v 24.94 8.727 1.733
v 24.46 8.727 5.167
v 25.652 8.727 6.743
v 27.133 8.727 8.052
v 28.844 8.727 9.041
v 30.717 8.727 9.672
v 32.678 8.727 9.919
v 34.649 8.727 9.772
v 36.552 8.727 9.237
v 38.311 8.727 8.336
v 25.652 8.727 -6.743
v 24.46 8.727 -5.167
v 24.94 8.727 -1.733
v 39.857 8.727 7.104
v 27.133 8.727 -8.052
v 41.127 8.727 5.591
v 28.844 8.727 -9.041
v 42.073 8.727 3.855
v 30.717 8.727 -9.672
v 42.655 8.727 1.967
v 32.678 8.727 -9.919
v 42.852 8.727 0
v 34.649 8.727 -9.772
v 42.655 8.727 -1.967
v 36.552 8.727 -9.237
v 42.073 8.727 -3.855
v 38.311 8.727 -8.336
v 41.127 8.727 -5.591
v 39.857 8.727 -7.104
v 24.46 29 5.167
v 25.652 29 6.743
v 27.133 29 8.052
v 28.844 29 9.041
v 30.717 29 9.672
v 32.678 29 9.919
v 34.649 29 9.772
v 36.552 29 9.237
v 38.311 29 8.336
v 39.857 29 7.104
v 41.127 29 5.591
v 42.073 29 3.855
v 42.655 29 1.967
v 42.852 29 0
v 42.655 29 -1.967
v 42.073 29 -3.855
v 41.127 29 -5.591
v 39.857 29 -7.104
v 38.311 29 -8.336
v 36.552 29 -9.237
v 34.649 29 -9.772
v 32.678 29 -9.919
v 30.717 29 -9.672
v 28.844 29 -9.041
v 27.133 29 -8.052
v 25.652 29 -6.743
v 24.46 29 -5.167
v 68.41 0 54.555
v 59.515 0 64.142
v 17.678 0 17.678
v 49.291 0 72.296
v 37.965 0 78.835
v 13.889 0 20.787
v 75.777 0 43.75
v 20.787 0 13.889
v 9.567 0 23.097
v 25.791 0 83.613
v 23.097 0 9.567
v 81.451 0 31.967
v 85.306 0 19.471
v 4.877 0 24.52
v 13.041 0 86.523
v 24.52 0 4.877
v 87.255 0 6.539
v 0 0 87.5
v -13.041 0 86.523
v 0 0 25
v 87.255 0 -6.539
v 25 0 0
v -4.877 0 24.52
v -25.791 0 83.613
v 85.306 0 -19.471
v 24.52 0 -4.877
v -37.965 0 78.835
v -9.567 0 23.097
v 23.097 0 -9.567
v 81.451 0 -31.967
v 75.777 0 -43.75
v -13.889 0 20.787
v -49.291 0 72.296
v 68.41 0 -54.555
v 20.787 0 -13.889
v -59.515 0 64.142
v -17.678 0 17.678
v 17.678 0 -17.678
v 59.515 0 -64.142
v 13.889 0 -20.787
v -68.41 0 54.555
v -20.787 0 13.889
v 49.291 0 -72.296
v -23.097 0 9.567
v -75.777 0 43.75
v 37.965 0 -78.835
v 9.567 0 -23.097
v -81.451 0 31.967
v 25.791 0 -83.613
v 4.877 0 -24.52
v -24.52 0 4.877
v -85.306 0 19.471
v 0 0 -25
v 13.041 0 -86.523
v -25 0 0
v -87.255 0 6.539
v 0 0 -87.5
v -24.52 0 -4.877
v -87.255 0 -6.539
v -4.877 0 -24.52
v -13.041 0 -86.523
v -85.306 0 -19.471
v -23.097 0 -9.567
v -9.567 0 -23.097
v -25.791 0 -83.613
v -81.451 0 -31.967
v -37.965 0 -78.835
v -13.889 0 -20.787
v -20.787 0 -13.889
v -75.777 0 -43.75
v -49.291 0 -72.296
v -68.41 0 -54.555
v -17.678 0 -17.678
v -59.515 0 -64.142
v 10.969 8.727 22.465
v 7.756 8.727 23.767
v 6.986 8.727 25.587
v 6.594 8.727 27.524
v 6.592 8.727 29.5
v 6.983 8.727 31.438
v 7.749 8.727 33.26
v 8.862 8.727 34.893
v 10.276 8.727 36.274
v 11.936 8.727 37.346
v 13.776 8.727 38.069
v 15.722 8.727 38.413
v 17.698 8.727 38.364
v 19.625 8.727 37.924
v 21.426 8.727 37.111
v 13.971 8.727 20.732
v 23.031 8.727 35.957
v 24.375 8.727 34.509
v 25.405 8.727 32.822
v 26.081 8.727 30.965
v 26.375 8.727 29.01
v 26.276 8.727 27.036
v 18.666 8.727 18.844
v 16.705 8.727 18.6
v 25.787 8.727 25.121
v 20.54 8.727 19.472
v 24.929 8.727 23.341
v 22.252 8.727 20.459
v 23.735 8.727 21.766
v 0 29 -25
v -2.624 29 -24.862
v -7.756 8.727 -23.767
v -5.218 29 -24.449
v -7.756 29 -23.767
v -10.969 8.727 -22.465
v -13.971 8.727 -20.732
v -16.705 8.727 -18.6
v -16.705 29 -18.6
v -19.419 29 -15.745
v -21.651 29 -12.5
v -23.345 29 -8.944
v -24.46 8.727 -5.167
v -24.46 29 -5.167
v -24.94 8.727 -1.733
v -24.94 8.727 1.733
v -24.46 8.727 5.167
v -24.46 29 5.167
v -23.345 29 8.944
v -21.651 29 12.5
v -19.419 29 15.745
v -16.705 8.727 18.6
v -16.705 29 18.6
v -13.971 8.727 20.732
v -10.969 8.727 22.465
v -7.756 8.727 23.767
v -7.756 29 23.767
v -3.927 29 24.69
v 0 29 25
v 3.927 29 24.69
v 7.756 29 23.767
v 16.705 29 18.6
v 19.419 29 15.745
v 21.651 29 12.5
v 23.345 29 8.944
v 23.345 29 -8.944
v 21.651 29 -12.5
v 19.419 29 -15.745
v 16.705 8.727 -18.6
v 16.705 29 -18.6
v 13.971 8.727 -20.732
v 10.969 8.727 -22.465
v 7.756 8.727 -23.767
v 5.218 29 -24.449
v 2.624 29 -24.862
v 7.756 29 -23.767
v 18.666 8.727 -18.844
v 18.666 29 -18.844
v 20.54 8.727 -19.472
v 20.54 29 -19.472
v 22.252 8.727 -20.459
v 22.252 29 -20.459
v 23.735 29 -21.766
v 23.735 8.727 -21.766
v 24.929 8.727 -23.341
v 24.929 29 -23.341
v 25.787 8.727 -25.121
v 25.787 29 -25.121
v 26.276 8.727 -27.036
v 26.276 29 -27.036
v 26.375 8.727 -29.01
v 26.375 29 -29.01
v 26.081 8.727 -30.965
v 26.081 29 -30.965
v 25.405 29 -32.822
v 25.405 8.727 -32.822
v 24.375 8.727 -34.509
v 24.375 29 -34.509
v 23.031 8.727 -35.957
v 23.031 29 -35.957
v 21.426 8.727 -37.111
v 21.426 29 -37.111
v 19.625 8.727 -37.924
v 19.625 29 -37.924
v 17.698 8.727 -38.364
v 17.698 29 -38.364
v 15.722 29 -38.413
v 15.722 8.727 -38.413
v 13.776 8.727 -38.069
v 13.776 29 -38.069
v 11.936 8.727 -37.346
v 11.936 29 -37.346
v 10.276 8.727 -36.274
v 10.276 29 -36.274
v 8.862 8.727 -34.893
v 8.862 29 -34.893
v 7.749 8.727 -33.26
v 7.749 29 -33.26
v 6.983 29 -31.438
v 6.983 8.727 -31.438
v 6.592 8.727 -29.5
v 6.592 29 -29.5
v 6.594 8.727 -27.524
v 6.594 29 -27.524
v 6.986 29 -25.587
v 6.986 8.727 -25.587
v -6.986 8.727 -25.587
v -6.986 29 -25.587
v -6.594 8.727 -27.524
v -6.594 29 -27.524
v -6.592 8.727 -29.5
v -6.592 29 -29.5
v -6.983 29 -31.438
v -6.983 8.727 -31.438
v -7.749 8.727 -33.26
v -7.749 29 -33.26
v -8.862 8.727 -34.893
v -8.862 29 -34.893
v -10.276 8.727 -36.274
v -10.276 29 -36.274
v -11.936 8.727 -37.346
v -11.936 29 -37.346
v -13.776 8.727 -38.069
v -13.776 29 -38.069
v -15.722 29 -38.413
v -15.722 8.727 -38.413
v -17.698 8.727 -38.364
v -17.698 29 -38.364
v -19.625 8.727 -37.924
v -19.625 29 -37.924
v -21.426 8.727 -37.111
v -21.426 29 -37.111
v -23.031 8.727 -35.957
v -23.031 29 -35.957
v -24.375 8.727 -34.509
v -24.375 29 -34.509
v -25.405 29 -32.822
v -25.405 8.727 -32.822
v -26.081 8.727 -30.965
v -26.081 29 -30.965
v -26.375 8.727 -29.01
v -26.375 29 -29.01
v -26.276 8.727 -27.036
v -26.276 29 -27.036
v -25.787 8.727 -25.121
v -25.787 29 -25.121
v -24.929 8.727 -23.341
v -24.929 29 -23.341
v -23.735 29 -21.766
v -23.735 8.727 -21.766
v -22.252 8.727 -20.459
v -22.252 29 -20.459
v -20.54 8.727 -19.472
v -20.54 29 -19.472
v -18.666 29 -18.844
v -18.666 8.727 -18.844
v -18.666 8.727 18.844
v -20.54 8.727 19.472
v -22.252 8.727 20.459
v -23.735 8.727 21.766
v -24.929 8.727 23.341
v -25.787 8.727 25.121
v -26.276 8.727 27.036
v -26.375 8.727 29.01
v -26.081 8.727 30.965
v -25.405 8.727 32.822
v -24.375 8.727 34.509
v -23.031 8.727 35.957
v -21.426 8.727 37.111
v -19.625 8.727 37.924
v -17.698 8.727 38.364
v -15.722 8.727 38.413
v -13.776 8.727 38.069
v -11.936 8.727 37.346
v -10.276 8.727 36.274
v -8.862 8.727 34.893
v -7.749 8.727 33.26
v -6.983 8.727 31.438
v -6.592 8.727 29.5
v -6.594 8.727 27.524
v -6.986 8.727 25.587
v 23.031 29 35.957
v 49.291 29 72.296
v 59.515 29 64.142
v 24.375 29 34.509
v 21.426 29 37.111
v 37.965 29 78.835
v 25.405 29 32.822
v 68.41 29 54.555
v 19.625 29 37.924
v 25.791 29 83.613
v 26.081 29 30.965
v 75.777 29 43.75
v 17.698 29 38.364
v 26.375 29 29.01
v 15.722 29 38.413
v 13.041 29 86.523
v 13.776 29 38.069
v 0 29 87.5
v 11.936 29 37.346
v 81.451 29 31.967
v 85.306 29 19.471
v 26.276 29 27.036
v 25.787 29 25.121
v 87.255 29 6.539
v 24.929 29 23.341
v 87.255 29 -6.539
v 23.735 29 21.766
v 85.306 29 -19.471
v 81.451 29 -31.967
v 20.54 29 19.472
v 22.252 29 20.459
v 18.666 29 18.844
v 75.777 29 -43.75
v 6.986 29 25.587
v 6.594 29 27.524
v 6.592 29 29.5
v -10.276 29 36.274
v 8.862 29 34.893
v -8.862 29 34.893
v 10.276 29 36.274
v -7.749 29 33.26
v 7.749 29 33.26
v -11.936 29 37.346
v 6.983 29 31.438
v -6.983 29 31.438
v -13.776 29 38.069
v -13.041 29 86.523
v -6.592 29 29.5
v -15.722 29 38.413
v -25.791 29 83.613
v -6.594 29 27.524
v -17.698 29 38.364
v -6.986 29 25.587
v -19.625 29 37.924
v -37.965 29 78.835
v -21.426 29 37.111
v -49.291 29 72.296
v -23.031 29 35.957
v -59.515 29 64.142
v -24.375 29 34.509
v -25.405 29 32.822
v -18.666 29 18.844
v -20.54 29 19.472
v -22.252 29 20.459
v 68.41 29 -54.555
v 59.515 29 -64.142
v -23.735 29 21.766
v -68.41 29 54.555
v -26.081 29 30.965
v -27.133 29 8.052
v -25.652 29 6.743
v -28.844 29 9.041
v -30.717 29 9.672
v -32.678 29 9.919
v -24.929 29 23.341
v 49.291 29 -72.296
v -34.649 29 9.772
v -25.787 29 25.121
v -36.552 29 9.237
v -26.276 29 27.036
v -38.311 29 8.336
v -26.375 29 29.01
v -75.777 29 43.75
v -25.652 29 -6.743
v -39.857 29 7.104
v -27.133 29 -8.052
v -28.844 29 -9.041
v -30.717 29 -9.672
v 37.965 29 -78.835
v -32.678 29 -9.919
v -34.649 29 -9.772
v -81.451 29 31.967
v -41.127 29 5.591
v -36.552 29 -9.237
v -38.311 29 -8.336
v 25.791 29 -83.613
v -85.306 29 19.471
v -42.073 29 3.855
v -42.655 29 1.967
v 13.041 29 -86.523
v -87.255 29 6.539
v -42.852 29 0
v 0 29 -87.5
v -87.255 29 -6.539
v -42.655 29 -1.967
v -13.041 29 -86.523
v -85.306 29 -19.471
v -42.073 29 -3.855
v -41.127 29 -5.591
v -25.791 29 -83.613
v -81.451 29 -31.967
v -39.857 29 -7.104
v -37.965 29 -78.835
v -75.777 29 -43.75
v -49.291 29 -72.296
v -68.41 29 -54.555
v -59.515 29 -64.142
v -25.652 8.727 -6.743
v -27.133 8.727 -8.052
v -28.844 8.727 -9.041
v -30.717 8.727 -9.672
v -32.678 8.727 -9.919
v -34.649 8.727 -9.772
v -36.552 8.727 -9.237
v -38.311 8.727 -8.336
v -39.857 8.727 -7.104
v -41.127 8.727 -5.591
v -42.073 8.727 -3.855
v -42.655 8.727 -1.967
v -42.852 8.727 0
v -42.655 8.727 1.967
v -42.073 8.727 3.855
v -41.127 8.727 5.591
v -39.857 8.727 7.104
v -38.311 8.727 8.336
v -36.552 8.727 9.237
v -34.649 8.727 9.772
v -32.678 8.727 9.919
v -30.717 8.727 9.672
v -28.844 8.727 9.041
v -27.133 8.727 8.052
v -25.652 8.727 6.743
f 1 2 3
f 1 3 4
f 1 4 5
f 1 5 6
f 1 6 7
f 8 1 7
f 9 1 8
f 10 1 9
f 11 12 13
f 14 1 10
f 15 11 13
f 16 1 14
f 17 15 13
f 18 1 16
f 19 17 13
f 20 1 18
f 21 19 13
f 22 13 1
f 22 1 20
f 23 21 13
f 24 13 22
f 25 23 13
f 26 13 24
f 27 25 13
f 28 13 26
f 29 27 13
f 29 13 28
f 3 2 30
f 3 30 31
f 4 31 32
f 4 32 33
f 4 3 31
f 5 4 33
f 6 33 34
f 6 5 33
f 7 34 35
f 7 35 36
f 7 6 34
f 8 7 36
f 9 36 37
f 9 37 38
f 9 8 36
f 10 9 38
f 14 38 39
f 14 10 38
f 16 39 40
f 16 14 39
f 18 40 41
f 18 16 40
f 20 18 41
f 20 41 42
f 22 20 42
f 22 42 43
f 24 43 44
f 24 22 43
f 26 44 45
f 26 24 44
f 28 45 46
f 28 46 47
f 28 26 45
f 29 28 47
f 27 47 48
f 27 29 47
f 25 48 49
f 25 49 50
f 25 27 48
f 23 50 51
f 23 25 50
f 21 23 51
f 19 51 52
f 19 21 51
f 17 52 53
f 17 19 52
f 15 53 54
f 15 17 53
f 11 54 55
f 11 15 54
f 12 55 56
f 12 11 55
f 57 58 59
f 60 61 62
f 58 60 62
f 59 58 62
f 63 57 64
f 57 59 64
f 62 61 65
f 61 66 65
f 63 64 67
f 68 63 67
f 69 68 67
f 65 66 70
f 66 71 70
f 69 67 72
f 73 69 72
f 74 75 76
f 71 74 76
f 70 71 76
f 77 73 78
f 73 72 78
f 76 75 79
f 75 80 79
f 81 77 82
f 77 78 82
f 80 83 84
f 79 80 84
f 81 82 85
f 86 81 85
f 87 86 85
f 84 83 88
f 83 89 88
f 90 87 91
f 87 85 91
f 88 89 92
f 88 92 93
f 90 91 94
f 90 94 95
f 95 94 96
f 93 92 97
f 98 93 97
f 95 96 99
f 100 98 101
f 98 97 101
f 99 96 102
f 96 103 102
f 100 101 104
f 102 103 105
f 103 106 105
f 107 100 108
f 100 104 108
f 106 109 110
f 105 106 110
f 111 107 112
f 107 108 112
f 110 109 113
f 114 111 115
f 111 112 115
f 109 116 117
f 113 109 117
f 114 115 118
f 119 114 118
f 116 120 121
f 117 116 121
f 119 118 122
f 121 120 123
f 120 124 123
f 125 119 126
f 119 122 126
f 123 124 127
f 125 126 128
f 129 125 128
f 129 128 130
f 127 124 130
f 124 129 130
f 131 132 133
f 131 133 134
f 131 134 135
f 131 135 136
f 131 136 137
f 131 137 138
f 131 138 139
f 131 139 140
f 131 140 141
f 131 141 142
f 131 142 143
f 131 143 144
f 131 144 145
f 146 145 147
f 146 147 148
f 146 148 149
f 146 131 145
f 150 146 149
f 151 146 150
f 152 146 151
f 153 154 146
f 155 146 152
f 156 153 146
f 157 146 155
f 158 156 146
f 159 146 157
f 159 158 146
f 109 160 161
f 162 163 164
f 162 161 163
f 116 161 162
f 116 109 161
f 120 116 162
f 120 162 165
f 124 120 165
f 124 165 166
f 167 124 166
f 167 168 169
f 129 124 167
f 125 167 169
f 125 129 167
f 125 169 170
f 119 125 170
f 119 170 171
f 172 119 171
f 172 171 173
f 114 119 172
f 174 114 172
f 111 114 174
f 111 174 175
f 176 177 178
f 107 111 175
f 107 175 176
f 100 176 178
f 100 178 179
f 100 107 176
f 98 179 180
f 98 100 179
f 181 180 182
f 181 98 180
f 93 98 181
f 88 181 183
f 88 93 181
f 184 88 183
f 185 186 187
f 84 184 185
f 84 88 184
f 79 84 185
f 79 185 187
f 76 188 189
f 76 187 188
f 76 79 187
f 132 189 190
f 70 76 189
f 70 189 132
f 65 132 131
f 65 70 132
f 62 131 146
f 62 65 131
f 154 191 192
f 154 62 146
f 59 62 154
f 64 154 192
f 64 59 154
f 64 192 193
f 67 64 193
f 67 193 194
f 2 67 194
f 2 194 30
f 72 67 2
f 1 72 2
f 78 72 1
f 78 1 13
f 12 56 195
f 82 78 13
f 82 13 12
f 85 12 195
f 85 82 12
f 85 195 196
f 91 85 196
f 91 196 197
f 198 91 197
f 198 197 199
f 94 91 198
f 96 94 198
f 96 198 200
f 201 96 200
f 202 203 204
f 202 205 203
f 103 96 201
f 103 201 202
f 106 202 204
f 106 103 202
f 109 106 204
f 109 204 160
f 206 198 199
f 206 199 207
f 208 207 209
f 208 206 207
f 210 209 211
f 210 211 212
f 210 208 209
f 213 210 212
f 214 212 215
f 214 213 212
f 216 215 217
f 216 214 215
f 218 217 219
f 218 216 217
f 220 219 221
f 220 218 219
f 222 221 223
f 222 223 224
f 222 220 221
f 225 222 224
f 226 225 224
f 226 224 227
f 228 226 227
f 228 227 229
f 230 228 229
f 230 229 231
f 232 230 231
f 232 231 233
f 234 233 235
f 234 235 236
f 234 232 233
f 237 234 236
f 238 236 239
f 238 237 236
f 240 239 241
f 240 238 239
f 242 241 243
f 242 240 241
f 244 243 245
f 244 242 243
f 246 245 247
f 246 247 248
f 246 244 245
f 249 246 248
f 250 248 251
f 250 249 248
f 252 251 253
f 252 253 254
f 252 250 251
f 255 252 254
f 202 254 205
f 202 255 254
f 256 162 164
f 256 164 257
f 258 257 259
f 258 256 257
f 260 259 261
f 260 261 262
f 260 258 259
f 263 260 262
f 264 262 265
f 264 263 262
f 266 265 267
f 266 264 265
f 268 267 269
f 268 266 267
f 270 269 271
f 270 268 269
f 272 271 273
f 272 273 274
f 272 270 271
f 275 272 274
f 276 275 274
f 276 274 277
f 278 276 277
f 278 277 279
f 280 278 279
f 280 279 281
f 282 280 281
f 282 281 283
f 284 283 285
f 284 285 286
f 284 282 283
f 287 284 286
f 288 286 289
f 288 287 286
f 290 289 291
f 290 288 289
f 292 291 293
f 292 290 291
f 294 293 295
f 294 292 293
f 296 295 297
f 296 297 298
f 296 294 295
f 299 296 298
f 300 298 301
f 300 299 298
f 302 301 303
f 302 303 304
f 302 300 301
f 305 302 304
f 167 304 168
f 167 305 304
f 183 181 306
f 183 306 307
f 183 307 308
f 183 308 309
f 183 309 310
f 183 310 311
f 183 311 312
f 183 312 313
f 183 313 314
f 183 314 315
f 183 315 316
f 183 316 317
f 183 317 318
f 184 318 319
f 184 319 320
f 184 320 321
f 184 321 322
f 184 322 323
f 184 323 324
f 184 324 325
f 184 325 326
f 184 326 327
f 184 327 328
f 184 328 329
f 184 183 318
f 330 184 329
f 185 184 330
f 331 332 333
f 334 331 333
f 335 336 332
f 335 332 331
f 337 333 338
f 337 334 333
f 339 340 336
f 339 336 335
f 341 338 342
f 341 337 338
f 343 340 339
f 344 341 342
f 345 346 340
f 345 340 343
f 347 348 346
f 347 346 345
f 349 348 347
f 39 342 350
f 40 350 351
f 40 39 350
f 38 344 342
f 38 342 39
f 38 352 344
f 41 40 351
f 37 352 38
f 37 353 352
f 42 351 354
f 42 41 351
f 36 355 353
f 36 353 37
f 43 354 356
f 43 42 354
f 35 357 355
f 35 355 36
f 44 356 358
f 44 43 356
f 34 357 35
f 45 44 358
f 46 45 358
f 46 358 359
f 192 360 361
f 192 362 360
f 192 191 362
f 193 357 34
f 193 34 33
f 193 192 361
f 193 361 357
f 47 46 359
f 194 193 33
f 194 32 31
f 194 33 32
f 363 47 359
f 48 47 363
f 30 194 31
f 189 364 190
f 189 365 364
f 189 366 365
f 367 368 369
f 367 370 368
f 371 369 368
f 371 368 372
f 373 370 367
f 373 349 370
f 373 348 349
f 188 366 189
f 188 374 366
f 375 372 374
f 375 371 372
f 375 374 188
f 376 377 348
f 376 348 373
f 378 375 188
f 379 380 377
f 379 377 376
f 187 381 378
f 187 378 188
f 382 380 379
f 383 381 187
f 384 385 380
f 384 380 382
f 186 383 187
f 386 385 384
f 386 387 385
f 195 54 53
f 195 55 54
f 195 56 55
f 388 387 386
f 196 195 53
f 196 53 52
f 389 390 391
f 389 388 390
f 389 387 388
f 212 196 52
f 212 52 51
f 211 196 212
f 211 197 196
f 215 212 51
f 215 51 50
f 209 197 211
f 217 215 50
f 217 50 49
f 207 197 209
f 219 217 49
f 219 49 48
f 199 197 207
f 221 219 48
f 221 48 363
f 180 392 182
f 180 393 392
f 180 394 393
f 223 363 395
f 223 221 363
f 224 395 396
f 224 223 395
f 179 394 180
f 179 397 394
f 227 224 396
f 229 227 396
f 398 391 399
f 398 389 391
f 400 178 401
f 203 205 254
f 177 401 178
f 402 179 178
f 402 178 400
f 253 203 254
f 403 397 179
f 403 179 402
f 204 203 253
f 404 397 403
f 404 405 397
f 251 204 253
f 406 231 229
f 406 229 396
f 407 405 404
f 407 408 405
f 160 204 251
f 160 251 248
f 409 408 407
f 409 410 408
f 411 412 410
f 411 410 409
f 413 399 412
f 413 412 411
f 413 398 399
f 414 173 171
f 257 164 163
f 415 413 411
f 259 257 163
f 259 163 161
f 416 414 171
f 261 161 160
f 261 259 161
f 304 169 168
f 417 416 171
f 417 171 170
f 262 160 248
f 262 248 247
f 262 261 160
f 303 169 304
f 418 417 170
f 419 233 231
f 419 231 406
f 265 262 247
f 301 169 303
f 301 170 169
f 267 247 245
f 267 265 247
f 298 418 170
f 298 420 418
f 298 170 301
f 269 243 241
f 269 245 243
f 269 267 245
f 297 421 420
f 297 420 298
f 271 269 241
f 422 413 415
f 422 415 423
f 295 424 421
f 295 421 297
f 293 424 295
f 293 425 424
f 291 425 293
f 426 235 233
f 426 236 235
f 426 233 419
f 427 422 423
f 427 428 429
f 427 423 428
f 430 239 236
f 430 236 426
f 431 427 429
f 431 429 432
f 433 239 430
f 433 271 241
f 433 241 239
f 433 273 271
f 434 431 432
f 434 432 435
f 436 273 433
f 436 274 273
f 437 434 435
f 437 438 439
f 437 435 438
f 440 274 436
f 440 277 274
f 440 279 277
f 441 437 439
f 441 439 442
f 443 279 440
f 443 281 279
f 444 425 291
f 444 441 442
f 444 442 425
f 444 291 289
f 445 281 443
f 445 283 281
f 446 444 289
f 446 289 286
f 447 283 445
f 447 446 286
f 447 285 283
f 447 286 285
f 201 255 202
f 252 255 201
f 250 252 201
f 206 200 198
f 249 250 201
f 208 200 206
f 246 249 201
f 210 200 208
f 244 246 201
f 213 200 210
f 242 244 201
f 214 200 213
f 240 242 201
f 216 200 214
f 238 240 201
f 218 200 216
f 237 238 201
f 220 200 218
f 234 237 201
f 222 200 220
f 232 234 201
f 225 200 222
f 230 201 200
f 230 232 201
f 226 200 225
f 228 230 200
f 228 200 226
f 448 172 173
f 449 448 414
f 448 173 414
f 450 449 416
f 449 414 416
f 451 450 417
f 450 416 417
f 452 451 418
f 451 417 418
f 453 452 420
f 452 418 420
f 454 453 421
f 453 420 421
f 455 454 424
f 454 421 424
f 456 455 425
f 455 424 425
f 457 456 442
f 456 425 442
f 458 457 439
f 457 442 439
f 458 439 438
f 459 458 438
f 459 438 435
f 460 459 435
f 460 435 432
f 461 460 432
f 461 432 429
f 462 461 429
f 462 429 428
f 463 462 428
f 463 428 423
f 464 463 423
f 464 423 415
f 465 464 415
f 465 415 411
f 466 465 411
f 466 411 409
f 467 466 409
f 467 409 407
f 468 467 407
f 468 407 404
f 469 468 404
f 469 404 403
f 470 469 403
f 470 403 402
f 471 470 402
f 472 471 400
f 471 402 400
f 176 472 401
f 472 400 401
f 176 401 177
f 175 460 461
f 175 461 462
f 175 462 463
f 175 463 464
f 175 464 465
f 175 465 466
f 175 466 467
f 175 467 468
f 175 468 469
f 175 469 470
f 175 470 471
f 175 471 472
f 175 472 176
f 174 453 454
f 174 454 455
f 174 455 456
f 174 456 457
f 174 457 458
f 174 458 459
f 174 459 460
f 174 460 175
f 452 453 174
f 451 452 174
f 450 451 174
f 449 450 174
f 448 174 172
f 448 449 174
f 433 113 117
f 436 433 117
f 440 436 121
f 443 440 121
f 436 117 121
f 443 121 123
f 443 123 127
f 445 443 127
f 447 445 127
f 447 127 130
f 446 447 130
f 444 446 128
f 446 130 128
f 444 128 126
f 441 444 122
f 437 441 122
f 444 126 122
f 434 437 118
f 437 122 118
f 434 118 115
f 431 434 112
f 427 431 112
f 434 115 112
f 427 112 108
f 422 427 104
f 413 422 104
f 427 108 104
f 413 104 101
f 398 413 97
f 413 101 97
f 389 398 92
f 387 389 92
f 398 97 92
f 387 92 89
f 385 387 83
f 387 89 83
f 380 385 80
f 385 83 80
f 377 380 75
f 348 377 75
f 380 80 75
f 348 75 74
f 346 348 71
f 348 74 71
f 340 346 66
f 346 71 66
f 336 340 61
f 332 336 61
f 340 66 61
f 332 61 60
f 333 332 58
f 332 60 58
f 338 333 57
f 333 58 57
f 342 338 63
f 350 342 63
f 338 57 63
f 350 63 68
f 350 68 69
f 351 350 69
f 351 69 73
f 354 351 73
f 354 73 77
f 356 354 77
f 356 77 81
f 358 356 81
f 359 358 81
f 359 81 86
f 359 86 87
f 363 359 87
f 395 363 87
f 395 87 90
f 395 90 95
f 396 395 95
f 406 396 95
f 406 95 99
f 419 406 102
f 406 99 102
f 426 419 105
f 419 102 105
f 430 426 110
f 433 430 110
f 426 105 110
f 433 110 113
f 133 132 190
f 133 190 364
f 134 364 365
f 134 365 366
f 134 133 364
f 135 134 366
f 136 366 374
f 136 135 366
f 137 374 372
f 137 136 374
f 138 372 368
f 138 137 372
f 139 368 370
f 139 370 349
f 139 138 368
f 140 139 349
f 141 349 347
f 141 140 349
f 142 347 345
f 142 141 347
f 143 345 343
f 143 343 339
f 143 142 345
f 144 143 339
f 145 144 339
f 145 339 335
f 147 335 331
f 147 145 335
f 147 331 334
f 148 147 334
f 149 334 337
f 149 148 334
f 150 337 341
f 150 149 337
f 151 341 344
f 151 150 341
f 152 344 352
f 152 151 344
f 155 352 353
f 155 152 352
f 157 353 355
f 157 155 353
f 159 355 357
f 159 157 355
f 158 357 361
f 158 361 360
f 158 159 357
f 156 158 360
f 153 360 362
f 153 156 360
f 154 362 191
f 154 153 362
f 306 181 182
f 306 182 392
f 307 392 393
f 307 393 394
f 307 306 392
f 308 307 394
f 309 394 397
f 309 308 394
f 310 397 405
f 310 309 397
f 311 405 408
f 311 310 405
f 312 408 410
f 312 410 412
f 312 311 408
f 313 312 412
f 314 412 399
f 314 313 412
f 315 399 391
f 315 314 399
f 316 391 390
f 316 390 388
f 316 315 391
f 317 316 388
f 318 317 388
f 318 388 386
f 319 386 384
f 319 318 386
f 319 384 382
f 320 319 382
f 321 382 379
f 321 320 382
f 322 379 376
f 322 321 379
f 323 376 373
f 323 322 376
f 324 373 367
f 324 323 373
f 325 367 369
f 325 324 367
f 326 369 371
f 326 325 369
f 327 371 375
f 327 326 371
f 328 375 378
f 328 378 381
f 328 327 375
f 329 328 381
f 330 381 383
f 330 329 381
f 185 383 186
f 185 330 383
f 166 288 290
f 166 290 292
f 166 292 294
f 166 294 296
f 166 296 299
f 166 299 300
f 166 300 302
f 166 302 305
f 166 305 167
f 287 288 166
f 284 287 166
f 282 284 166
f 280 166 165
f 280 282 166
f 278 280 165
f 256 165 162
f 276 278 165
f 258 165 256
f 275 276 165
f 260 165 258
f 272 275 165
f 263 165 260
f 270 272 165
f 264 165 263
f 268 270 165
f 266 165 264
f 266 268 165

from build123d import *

# Parameters (mm, degrees)
SKETCH1_R           = 87.5
BOSS_EXTRUDE1_DEPTH = 29
SKETCH2_R           = 25
CUT_EXTRUDE1_DEPTH  = 128.096420091
SKETCH3_R           = 9.921747731
CUT_EXTRUDE2_DEPTH  = 20.272624351
CIRPATTERN1_COUNT   = 6


with BuildPart() as part:
    # Sketch1 → Boss-Extrude1 (new body)
    with BuildSketch(Plane(origin=(0, 0, 0), x_dir=(1, 0, 0), z_dir=(0, 1, 0))):
        Circle(SKETCH1_R)
    extrude(amount=BOSS_EXTRUDE1_DEPTH)

    # Sketch2 → Cut-Extrude1 (cut, through all)
    with BuildSketch(Plane(origin=(0, 0, 0), x_dir=(1, 0, 0), z_dir=(0, 1, 0))):
        Circle(SKETCH2_R)
    extrude(amount=CUT_EXTRUDE1_DEPTH, mode=Mode.SUBTRACT)

    # Sketch3 → Cut-Extrude2 (cut)
    with BuildSketch(Plane(origin=(0, 29, 0), x_dir=(1, 0, 0), z_dir=(0, 1, 0))):
        with Locations((-32.93055591, 0)):
            Circle(SKETCH3_R)
    cut_extrude2 = extrude(amount=-CUT_EXTRUDE2_DEPTH, mode=Mode.SUBTRACT)

    # CirPattern1: Cut-Extrude2 ×6 about axis
    cirpattern1_axis = Axis((0, 0, 0), (0, 1, 0))
    for i in range(1, CIRPATTERN1_COUNT):
        add(cut_extrude2.rotate(cirpattern1_axis, i * 360 / CIRPATTERN1_COUNT), mode=Mode.SUBTRACT)


solid = part.part
